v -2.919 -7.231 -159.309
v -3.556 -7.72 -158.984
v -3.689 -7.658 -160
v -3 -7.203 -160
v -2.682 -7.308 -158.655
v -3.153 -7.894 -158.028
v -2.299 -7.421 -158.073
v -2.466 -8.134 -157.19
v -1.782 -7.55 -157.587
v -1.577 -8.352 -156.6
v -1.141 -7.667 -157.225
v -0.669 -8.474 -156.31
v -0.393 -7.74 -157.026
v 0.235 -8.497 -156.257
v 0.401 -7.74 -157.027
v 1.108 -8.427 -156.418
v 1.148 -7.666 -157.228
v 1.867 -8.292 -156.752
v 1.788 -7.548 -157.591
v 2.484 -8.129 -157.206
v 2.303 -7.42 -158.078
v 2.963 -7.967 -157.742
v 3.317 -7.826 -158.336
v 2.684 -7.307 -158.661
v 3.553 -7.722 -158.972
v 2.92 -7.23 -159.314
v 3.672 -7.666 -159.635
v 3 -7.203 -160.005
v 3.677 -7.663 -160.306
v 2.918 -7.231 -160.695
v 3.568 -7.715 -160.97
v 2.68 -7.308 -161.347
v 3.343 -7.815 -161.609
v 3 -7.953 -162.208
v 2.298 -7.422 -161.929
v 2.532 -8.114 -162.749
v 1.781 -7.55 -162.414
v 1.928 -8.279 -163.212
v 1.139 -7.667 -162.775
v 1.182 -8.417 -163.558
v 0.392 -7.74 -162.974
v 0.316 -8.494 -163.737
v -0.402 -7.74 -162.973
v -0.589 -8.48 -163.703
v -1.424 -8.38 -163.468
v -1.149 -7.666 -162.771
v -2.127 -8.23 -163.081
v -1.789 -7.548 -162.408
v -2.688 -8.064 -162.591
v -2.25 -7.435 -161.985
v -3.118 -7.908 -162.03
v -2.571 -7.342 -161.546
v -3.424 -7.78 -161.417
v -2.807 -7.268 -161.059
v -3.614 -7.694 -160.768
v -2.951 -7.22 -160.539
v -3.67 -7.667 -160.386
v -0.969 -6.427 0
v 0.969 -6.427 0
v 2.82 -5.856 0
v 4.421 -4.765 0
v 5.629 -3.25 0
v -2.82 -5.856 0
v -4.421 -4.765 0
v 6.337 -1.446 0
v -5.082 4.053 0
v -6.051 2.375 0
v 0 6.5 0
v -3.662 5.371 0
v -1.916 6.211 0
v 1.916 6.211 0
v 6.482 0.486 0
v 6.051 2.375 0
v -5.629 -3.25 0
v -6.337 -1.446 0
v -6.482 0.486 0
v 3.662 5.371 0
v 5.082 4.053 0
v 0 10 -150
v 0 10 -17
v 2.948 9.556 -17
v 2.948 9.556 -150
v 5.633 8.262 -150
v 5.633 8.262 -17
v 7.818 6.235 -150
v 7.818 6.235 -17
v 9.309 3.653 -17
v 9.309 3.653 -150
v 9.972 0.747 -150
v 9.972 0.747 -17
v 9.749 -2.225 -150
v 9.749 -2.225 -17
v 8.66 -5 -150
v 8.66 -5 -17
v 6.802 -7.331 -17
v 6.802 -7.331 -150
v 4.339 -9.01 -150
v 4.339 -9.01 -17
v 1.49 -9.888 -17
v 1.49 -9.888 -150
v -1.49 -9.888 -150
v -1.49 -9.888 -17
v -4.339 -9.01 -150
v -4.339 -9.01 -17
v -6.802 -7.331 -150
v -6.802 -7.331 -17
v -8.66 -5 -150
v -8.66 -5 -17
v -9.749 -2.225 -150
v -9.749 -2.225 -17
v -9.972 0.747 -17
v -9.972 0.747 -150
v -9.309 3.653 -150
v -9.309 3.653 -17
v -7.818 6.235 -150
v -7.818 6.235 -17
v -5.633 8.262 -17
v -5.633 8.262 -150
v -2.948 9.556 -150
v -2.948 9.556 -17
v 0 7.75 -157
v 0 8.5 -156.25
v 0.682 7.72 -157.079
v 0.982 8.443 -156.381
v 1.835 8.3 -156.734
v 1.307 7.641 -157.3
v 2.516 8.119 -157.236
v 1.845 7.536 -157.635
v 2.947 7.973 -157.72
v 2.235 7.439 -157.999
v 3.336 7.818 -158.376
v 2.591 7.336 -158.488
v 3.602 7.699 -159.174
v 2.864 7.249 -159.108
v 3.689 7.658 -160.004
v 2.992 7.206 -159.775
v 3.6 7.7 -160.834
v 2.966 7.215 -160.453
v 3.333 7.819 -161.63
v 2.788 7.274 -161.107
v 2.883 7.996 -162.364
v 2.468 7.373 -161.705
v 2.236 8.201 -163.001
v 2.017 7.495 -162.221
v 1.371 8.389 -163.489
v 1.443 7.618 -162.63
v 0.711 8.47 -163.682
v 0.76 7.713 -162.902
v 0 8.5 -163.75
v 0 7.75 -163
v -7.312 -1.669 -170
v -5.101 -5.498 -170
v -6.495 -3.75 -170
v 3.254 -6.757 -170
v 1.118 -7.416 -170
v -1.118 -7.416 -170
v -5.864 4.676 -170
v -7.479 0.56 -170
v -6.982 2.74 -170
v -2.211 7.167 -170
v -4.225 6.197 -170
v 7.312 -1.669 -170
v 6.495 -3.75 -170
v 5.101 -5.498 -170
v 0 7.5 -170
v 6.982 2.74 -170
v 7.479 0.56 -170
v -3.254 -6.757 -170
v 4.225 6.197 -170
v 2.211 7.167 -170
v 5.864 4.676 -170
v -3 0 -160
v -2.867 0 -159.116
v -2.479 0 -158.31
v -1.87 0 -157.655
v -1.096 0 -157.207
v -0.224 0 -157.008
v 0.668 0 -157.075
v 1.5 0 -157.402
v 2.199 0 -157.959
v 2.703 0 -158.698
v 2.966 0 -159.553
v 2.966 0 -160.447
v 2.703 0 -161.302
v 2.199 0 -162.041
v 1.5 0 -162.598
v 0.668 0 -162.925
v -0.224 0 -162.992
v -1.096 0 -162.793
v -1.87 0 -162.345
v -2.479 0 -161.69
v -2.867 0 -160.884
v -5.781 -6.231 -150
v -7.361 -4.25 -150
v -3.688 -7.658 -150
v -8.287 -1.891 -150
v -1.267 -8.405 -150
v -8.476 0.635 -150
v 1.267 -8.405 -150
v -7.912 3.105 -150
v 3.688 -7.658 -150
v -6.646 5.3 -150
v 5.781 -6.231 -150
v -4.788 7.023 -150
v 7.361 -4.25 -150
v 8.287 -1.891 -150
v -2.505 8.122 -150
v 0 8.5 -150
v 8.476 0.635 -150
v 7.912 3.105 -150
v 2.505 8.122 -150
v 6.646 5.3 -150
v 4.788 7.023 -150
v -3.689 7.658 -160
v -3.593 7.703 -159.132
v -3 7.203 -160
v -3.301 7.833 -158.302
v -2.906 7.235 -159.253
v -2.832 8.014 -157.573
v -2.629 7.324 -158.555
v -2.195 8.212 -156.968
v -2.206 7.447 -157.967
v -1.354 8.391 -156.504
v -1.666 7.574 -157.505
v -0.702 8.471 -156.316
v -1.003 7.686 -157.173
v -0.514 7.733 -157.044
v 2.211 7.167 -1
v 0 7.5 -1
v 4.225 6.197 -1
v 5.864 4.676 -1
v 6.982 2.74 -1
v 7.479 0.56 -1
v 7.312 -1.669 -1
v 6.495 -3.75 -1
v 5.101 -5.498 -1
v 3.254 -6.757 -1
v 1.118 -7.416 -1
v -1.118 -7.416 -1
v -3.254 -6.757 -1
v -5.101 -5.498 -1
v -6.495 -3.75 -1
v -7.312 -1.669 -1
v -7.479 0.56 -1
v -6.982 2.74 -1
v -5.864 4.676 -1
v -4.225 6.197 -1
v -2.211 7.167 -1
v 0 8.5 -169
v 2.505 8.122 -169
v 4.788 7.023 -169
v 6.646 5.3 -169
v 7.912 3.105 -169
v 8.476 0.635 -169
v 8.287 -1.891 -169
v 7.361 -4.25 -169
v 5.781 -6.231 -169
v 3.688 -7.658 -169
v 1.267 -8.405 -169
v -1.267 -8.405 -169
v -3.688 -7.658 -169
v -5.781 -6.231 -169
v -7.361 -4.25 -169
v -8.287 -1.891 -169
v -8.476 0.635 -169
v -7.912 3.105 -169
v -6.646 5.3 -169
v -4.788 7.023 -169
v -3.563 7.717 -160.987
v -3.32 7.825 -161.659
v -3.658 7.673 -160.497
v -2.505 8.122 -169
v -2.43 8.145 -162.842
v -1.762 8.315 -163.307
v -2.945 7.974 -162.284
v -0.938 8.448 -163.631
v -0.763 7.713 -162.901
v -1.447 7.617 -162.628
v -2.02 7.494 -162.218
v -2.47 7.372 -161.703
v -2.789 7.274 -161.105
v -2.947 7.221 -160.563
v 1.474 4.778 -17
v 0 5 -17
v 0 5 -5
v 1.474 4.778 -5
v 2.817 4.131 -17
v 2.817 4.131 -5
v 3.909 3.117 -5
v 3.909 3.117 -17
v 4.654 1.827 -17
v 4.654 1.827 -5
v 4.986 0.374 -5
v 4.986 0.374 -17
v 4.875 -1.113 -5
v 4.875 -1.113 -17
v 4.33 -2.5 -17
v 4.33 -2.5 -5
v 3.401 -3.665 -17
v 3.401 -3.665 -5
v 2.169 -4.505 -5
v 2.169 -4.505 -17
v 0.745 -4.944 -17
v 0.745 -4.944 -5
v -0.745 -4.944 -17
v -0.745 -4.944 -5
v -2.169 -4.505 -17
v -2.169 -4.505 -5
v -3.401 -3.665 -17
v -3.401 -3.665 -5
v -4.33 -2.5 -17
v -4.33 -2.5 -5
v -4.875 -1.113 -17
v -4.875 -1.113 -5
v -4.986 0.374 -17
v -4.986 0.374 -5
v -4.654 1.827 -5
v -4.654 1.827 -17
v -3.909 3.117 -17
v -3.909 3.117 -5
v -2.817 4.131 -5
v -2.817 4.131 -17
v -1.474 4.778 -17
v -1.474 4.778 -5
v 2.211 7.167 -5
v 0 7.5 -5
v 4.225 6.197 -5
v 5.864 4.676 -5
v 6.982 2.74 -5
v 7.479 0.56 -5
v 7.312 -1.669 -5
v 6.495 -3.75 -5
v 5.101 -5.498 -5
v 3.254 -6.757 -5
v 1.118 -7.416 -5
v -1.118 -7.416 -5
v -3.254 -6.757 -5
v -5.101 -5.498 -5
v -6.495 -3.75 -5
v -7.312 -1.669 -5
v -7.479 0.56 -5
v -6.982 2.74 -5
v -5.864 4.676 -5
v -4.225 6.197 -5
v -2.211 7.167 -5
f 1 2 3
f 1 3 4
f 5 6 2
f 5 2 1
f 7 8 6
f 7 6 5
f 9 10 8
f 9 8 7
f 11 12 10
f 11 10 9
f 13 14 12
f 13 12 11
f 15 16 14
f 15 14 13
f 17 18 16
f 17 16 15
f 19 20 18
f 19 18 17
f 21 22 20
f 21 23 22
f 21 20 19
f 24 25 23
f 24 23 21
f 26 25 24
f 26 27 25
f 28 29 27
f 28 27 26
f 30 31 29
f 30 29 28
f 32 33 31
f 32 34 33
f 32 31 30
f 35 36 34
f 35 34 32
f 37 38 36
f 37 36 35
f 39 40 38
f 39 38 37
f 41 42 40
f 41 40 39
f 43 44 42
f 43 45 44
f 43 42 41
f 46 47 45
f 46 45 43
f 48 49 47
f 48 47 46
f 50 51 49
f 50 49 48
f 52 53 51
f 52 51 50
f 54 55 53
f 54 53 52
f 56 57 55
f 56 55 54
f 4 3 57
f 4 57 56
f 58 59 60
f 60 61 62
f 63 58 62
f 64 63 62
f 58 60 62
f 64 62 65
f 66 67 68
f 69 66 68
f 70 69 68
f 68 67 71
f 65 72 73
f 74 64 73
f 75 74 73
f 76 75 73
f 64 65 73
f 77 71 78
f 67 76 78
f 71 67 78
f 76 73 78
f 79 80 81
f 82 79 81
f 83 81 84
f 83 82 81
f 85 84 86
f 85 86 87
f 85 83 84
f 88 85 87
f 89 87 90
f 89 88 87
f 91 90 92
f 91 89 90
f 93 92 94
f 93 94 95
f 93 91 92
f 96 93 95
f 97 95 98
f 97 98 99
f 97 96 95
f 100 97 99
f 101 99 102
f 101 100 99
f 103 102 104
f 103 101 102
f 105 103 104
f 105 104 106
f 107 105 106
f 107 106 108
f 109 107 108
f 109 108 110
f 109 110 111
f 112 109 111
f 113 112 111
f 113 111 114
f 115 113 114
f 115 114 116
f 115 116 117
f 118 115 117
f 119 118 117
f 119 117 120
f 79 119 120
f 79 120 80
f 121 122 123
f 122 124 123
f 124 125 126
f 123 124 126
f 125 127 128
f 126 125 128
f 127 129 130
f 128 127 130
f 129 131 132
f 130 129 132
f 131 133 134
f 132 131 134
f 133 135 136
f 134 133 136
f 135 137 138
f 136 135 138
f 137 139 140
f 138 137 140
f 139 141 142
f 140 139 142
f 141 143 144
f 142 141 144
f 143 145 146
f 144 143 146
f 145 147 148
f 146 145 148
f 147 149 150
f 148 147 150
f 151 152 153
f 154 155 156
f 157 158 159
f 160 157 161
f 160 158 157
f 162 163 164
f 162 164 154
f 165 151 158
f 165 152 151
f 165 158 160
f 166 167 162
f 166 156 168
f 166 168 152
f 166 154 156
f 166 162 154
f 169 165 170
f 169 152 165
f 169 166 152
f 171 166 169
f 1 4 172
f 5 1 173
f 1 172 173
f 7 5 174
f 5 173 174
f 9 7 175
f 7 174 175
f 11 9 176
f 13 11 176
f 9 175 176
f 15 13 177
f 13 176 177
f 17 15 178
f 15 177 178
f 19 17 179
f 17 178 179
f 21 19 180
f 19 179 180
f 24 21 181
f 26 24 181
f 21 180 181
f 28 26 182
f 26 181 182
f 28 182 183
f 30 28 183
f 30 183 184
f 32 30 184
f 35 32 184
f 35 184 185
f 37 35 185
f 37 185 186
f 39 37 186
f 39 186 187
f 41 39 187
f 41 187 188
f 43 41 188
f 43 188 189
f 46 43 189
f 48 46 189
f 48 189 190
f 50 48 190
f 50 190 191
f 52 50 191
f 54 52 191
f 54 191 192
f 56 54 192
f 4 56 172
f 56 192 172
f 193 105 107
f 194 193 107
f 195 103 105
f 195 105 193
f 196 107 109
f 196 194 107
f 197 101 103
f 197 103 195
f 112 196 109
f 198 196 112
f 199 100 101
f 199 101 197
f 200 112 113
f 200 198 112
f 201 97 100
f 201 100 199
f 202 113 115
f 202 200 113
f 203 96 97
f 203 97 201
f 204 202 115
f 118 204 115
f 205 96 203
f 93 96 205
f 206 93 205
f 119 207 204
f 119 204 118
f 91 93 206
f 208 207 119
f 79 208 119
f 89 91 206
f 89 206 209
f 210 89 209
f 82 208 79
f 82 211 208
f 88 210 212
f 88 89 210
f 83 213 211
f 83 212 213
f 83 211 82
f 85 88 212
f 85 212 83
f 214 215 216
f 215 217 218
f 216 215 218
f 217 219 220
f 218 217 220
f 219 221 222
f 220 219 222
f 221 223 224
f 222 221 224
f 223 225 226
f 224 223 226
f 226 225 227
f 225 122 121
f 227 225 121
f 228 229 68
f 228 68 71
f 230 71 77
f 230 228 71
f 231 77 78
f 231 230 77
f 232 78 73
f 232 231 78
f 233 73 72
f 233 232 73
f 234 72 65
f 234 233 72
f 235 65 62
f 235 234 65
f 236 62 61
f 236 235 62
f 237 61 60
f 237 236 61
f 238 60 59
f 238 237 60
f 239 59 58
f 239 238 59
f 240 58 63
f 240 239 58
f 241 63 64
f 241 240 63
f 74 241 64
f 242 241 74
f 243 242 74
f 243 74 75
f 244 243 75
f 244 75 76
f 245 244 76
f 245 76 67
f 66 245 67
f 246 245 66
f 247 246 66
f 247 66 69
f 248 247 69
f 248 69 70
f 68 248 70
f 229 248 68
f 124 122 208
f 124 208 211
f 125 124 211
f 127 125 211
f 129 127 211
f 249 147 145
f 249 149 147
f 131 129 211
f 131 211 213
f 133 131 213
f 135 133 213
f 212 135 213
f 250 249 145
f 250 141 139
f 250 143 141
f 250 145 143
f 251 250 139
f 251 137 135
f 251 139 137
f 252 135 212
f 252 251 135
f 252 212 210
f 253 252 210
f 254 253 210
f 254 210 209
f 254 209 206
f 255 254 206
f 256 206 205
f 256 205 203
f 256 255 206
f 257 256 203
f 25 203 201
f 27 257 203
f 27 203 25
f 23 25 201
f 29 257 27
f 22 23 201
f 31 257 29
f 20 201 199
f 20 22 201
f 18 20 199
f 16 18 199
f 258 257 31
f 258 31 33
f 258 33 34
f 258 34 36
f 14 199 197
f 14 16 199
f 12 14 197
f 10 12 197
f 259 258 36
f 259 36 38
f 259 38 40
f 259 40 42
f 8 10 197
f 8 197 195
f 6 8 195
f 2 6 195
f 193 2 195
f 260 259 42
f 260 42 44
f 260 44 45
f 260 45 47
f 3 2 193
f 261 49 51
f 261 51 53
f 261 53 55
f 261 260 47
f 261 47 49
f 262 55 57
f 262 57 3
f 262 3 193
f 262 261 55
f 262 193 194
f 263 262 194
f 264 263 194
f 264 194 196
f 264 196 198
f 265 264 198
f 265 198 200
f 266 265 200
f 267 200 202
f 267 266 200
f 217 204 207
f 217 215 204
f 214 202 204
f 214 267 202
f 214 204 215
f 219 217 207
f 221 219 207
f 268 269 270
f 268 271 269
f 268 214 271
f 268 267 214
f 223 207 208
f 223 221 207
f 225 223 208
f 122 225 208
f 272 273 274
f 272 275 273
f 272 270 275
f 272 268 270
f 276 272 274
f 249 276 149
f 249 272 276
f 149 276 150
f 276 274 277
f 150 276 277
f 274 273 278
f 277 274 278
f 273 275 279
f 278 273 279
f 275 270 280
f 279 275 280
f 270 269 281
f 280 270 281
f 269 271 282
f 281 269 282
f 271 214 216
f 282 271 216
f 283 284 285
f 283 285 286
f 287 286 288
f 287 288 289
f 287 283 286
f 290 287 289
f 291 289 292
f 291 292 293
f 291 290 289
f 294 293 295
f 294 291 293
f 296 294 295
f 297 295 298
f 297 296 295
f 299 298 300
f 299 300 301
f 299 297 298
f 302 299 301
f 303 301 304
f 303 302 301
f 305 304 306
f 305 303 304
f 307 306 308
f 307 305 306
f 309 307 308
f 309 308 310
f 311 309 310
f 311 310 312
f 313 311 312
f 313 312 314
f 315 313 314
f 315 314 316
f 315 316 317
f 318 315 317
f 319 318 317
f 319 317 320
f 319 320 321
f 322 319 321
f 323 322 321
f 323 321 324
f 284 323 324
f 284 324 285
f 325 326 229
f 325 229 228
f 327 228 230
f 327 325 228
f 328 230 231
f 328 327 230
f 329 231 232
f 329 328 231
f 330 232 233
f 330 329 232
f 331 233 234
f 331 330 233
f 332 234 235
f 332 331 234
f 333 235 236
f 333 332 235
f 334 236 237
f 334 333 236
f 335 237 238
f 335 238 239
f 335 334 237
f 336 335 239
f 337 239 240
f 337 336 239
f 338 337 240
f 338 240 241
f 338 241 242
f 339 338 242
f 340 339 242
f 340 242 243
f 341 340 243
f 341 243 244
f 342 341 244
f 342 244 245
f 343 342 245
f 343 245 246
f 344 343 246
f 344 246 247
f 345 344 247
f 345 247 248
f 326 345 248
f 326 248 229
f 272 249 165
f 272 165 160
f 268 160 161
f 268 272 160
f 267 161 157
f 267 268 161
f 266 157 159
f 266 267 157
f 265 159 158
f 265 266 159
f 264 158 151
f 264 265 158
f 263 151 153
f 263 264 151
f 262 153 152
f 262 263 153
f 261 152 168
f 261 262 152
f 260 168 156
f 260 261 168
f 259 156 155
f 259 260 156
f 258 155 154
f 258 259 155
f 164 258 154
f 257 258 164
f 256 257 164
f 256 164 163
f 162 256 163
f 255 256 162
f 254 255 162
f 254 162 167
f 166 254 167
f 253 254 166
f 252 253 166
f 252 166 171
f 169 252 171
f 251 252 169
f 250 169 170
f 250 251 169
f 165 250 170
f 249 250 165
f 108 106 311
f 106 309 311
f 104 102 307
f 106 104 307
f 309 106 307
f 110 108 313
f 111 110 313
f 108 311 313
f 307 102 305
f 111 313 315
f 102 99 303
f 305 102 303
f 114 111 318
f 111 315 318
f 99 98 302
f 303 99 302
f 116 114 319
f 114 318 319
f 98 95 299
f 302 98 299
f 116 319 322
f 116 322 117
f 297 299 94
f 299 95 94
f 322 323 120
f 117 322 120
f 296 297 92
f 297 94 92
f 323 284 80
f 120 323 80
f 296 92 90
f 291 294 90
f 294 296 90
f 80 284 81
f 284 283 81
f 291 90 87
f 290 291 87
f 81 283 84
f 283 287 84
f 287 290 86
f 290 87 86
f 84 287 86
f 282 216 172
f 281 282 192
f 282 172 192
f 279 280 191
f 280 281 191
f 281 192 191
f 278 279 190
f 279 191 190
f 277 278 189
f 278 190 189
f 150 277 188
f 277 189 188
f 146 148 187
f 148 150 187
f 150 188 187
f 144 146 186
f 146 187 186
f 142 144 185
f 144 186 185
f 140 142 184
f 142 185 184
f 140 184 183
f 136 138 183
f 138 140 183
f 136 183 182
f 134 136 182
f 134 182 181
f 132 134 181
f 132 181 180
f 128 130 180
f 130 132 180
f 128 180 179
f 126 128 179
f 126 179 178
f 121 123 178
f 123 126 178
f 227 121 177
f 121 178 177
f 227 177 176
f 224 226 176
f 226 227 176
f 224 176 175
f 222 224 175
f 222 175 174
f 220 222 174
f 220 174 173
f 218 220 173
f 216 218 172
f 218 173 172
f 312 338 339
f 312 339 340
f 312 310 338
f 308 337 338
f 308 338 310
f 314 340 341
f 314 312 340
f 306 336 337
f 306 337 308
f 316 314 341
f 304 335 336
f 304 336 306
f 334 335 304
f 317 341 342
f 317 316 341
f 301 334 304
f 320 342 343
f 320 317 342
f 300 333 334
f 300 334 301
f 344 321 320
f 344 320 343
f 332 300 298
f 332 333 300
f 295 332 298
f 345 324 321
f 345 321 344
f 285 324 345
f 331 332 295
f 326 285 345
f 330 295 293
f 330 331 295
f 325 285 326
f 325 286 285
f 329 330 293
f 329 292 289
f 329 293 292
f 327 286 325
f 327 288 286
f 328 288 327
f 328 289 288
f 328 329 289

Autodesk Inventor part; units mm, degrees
ref_plane "YZ Plane" through (0, 0, 0) normal (1, 0, 0) x (0, 1, 0)
ref_plane "XZ Plane" through (0, 0, 0) normal (0, 1, 0) x (-1, 0, 0)
ref_plane "XY Plane" through (0, 0, 0) normal (0, 0, 1) x (1, 0, 0)
sketch "Sketch1" plane through (0, 0, 0) normal (1, 0, 0) x (0, 1, 0)
  line L0 (0, 0) -> (0, -170)
  line L1 (0, 0) -> (6.5, 0)
  line L2 (6.5, 0) -> (7.5, -1)
  line L3 (7.5, -1) -> (7.5, -5)
  line L4 (7.5, -5) -> (5, -5)
  line L5 (5, -5) -> (5, -17)
  line L6 (5, -17) -> (10, -17)
  line L7 (10, -17) -> (10, -150)
  line L8 (10, -150) -> (8.5, -150)
  line L9 (8.5, -150) -> (8.5, -169)
  line L10 (7.5, -170) -> (0, -170)
  line L11 (8.5, -169) -> (7.5, -170)
  point P0 (8.5, -170)
  dimension "d0" = 170
  dimension "d1" = 17
  dimension "d2" = 20
  dimension "d3" = 10
  dimension "d4" = 15
  dimension "d5" = 5
  dimension "d6" = 1
  dimension "d7" = 1
  dimension "d8" = 12
  dimension "d9" = 20
  dimension "d10" = 1
  dimension "d11" = 1
revolve "Revolution1" add sketch "Sketch1" angle 360 about axis through (0, 0, 0) along (0, 0, -1)
sketch "Sketch2" plane through (0, 0, 0) normal (0, 1, 0) x (-1, 0, 0)
  circle A0 centre (0, -160) radius 3
  line L0 (-7.5, -170) -> (7.5, -170) projected
  point P0 (0, 0)
  dimension "d13" = 6
  dimension "d14" = 10
extrude "Extrusion1" cut sketch "Sketch2" along normal through all both and the other way through all
chamfer "Chamfer1" distance 0.75 angle 45 4 edges at (3, 7.953, -159.9995) (-2.2741, 8.1902, -158.0433) (-2.2734, 8.1903, -161.9575) (3, -7.953, -160.0011)
thread "Thread1" size "TR20x2" class "7e" standard "ISO Metric Trapezoidal Threads" full length
equation "\"d11\" = d10"
